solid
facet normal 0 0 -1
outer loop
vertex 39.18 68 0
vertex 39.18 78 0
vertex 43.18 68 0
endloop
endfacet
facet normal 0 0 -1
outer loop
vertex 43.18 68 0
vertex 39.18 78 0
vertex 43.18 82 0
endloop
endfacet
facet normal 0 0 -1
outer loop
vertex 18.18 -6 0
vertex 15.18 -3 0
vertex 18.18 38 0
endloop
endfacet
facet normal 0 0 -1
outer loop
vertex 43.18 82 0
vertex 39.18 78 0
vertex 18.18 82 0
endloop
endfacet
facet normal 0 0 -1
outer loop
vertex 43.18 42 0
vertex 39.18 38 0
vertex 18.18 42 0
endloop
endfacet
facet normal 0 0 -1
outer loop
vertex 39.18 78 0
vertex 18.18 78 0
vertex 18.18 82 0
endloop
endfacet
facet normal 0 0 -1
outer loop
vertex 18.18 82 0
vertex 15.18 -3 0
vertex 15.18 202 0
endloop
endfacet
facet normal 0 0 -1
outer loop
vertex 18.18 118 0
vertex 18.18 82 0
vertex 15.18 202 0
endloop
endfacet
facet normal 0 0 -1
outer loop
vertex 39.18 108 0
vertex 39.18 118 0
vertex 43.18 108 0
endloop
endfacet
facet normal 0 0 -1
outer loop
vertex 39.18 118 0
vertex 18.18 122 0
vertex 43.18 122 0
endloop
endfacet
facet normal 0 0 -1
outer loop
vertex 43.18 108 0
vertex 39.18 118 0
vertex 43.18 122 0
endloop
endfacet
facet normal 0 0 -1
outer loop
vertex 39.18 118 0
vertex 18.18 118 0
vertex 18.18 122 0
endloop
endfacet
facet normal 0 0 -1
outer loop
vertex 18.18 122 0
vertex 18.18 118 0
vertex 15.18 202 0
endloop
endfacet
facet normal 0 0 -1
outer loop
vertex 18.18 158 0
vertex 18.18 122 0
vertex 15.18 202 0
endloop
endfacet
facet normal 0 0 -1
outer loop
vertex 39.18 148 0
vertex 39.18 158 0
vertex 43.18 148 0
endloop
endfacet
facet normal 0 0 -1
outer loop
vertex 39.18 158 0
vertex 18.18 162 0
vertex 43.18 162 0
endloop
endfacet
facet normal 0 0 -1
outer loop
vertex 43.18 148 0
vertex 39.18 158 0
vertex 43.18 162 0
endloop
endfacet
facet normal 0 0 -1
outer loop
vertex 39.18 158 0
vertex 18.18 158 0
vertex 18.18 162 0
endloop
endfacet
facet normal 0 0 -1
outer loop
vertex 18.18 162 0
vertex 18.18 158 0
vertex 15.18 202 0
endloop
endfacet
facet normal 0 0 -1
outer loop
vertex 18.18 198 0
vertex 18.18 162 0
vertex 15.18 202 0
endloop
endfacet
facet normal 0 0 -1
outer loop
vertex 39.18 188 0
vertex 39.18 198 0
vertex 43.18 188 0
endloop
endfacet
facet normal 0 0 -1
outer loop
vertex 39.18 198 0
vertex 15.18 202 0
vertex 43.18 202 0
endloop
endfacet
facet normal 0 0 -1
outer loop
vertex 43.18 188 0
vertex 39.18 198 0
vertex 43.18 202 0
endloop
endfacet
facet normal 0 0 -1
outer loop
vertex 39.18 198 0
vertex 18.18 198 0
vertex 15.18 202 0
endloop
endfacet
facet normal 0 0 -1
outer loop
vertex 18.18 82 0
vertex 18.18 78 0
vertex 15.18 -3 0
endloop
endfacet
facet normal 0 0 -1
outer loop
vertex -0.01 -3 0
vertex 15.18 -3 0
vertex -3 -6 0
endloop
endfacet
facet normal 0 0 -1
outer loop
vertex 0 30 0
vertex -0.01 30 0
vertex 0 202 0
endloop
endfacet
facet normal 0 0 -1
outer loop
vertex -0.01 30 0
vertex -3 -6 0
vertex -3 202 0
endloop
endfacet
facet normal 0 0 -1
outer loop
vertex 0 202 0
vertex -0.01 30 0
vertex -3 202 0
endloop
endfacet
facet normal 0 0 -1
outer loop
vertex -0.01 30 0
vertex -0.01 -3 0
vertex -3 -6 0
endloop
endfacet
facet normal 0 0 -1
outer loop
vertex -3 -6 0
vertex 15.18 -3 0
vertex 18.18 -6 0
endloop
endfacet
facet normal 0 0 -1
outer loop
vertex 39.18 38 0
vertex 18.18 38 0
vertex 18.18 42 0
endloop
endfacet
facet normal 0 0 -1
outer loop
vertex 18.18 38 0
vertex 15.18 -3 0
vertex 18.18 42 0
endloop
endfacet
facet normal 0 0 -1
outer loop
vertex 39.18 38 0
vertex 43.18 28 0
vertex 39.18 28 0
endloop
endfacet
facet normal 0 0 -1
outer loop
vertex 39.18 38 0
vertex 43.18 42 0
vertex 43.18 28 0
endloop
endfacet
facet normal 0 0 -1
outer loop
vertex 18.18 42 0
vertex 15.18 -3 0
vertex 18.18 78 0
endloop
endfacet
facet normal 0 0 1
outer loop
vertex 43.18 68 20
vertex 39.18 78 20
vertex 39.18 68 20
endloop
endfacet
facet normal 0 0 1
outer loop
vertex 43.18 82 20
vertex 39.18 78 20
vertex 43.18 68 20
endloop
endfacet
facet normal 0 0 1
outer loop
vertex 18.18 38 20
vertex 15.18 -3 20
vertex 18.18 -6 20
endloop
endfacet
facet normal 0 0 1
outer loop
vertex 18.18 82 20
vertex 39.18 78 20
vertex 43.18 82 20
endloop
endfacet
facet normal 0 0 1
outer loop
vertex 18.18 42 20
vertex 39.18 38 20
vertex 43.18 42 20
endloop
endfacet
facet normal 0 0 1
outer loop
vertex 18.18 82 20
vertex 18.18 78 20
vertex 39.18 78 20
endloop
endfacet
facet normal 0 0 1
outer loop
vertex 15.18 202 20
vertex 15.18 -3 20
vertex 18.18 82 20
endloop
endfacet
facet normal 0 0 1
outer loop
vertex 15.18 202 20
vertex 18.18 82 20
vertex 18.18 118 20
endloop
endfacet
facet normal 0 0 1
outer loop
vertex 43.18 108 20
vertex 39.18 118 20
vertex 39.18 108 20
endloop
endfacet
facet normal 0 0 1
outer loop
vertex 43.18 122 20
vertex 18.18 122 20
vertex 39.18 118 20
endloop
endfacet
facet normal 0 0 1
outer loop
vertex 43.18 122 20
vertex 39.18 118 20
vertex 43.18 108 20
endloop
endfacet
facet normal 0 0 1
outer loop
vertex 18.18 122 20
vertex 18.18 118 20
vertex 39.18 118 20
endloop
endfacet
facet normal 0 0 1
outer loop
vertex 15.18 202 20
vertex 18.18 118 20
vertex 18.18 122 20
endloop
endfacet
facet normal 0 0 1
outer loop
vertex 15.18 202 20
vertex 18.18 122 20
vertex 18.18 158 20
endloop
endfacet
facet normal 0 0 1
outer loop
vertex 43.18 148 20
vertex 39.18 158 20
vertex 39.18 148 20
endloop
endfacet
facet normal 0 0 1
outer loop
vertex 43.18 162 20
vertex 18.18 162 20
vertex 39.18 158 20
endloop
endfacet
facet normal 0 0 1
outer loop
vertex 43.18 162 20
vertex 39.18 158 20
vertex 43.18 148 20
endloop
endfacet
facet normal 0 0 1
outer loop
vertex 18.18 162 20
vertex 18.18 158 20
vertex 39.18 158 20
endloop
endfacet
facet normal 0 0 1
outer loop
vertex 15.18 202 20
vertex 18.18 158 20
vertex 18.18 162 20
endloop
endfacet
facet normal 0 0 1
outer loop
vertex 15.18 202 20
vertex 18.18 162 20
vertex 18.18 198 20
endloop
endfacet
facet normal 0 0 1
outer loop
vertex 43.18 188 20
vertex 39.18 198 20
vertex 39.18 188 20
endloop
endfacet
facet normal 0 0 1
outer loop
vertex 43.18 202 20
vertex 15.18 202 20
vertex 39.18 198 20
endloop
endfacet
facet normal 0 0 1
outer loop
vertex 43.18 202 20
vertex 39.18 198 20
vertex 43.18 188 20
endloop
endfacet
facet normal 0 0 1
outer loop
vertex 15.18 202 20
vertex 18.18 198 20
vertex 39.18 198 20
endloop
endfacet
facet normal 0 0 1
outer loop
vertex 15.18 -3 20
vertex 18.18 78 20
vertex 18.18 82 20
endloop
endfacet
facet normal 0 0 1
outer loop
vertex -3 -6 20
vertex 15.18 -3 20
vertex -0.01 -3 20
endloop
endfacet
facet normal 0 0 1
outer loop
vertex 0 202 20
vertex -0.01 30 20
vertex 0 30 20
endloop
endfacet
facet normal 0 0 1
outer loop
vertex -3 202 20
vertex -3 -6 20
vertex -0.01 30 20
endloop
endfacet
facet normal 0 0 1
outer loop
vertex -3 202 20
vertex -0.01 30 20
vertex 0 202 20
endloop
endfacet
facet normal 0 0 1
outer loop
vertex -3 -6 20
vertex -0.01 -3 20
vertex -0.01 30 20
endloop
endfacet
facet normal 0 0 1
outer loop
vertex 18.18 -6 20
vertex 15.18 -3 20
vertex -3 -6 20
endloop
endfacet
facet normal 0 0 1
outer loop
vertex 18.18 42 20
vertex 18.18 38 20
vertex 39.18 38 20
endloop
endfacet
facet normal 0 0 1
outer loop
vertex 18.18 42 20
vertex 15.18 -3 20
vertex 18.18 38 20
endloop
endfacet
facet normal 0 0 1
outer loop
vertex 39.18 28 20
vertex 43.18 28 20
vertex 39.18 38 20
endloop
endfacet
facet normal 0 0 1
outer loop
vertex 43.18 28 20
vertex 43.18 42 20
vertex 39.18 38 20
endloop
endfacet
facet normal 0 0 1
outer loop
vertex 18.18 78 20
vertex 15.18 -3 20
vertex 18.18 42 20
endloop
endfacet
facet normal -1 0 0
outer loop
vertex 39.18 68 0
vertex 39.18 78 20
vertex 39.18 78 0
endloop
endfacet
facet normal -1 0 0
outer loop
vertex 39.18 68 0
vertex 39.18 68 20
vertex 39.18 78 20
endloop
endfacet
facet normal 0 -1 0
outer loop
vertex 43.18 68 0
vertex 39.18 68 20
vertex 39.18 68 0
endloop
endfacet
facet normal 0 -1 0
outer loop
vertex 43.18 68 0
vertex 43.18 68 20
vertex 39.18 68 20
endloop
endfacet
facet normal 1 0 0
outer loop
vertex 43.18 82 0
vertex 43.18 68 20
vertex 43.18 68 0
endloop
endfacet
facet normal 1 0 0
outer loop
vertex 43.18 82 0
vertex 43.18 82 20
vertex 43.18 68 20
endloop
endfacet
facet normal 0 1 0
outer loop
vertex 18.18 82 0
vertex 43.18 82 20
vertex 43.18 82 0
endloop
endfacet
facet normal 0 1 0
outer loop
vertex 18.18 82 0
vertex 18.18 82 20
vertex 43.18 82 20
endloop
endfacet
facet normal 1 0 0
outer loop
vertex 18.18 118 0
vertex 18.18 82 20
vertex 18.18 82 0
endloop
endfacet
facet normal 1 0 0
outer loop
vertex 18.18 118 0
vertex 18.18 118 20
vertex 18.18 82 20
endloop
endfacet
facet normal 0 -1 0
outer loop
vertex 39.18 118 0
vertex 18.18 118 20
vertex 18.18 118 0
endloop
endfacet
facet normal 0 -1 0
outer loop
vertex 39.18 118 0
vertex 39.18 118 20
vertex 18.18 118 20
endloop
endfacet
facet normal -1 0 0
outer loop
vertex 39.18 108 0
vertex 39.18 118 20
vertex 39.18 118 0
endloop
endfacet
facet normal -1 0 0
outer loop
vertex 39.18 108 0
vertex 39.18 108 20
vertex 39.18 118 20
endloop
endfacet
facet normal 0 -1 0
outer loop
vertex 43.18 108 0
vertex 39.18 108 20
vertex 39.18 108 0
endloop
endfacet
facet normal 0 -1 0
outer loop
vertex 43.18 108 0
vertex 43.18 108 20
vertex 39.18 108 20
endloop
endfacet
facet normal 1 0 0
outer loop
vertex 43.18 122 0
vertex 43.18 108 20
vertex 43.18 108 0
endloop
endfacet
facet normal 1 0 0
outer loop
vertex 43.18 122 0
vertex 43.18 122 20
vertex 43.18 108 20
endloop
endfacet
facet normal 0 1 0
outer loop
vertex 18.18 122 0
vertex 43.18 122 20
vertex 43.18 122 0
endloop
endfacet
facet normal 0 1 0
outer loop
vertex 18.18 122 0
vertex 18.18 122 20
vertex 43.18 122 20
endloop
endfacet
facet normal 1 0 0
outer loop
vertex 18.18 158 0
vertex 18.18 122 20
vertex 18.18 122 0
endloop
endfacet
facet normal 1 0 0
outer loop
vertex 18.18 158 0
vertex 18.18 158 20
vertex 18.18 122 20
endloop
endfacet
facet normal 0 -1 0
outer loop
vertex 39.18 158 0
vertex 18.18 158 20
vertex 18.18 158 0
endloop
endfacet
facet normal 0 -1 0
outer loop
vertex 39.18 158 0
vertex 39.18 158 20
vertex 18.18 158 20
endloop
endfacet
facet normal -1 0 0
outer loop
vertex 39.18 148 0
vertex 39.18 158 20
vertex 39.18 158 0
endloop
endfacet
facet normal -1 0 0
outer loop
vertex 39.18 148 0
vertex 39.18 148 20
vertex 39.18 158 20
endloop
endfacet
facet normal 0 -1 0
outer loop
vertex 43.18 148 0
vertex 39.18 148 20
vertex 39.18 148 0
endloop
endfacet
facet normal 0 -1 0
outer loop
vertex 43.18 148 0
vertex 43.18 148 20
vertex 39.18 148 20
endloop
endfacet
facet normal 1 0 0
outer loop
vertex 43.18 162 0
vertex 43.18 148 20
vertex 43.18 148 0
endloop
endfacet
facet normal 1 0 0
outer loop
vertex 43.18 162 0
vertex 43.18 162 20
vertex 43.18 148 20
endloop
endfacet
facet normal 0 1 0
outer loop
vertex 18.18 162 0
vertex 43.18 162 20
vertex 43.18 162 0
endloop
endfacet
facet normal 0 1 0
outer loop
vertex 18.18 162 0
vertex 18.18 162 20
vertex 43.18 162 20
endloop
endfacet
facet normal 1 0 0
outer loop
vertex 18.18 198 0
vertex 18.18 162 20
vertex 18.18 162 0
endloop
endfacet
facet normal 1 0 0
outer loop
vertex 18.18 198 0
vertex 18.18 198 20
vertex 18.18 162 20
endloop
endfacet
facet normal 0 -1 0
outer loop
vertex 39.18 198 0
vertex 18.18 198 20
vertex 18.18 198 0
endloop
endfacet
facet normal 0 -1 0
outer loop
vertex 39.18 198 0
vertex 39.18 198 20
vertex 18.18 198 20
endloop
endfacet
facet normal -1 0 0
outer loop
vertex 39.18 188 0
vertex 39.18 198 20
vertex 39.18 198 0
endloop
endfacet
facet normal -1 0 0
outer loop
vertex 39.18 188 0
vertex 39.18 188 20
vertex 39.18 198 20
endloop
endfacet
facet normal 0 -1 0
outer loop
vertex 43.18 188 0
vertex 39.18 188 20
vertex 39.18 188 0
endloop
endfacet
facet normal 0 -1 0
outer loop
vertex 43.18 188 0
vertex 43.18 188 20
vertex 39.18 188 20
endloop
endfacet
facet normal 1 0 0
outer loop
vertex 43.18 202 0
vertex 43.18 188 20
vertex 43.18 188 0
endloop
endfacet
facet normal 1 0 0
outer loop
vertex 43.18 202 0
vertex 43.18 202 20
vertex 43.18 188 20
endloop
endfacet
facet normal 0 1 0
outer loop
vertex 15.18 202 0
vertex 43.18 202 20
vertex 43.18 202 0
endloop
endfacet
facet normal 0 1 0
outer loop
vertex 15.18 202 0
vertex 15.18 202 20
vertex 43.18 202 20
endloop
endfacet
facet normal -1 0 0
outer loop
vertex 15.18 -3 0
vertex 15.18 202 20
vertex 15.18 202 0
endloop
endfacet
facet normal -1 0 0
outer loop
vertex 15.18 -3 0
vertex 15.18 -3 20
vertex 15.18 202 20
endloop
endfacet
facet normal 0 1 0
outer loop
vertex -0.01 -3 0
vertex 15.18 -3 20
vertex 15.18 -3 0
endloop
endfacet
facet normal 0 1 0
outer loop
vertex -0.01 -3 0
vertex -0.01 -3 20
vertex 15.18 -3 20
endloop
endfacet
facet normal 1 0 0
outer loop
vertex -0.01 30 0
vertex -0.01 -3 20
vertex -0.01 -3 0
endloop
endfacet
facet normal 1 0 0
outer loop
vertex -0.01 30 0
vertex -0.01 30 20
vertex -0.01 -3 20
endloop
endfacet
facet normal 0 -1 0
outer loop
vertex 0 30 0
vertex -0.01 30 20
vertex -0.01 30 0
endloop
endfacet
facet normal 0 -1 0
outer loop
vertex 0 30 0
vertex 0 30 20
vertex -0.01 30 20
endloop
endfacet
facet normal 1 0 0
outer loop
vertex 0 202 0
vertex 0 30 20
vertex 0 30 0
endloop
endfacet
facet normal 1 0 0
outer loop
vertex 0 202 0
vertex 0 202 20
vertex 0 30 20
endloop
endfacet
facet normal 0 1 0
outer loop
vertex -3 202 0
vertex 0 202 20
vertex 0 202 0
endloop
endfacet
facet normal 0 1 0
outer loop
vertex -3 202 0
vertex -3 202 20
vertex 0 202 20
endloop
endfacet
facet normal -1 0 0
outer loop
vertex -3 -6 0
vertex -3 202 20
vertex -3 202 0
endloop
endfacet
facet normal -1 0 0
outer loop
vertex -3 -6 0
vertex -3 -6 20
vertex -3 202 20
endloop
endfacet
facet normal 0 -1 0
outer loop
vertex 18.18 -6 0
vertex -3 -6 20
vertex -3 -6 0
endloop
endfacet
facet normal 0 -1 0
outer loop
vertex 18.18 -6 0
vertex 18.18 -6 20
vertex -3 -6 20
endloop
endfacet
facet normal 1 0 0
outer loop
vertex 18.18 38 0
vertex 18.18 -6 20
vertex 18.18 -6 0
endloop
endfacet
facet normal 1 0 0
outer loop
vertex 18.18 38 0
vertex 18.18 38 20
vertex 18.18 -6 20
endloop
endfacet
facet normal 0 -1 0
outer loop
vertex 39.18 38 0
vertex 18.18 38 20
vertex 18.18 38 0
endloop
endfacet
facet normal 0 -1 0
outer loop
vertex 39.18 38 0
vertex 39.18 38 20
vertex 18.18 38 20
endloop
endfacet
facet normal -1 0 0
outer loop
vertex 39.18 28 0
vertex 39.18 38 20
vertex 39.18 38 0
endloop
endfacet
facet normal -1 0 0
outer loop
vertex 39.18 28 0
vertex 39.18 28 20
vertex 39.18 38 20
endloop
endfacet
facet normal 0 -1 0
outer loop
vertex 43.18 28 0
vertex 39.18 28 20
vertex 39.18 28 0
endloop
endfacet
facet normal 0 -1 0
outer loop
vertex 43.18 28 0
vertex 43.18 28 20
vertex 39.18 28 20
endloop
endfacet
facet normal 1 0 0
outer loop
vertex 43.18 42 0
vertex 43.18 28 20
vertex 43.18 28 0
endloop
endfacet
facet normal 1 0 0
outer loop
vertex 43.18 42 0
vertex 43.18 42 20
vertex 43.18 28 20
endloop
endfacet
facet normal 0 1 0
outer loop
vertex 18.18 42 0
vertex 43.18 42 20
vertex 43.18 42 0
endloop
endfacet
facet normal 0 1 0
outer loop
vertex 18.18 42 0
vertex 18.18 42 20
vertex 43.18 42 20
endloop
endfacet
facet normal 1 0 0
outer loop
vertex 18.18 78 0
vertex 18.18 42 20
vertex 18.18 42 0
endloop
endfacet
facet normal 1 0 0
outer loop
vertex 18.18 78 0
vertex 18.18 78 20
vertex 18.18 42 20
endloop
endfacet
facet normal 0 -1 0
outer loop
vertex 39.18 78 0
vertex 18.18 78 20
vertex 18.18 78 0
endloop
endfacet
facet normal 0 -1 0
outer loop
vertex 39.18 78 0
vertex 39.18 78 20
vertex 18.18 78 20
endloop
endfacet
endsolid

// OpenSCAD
// Parametric Door Hook Generator
// Units: mm

// ---------- Variables ----------
door_gap = 3;               // space between door and trim (the "drop")
door_thickness = 15.18;     // thickness of the door itself
hanger_tail_thickness = 3;  // thickness of the hanger walls

hook_count = 5;             // number of hooks
hook_depth = 25;            // how far the hook sticks out
hook_offset = 40;           // vertical distance between hooks

hanger_width = 20;          // how wide the object is (extrusion)
hanger_tail_length = 30;    // length of the backside drop

// --- Extra hook params ---
hook_thickness = 4;         // thickness of the hook arm
hook_up_height = 12;        // height of the hook's vertical "lip"

// ---------- Logic ----------

// Calculate spine length so it ends exactly at the bottom of the last hook
spine_length = (hook_count * hook_offset) + (hook_thickness / 2);

module door_hook() {
    // We create the side profile as a 2D shape, then extrude it.
    linear_extrude(height = hanger_width) {
        
        // 1. Main Hanger Body (The "U" over the door)
        // Coordinates: x=0 is the back of the door.
        // y=0 is the top surface of the door gap.
        
        polygon(points = [
            // Back tail outer
            [-hanger_tail_thickness, spine_length], 
            [-hanger_tail_thickness, -door_gap - hanger_tail_thickness],
            // Top bridge outer
            [door_thickness + hanger_tail_thickness, -door_gap - hanger_tail_thickness],
            // Front spine outer
            [door_thickness + hanger_tail_thickness, spine_length],
            // Front spine inner
            [door_thickness, spine_length],
            // Top bridge inner (underside)
            [door_thickness, -door_gap],
            [-0.01, -door_gap], // -.01 to ensure overlap
            // Back tail inner
            [-0.01, hanger_tail_length],
            [0, hanger_tail_length],
            [0, spine_length]
        ]);

        // 2. The Hooks
        // Position hooks along the front spine
        for (i = [1 : hook_count]) {
            translate([door_thickness + hanger_tail_thickness, i * hook_offset]) {
                // Hook arm
                translate([0, -hook_thickness/2]) 
                    square([hook_depth, hook_thickness]);
                
                // Hook lip (The "U" turn)
                translate([hook_depth - hook_thickness, -hook_up_height]) 
                    square([hook_thickness, hook_up_height]);
            }
        }
    }
}

// Render
door_hook();
